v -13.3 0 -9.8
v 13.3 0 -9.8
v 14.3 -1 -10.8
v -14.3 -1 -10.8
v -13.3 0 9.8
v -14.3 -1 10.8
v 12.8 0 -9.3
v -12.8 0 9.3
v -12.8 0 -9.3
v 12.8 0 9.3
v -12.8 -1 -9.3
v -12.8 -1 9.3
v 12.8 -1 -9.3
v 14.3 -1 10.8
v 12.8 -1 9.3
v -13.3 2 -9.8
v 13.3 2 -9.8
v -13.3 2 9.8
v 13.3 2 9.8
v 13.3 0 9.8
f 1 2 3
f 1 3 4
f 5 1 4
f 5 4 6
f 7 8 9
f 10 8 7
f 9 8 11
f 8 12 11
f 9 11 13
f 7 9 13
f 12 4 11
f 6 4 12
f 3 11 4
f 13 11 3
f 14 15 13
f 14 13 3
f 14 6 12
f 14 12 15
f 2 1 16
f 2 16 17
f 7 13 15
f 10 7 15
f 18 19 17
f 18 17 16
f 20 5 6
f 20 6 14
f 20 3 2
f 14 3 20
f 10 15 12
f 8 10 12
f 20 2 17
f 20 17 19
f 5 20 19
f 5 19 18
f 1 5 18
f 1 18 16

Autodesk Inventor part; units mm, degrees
ref_plane "YZ Plane" through (0, 0, 0) normal (1, 0, 0) x (0, 1, 0)
ref_plane "XZ Plane" through (0, 0, 0) normal (0, 1, 0) x (-1, 0, 0)
ref_plane "XY Plane" through (0, 0, 0) normal (0, 0, 1) x (1, 0, 0)
sketch "Sketch1" plane through (0, 0, 0) normal (0, 1, 0) x (-1, 0, 0)
  line L0 (-13.3, 9.8) -> (13.3, 9.8)
  line L1 (13.3, 9.8) -> (13.3, -9.8)
  line L2 (13.3, -9.8) -> (-13.3, -9.8)
  line L3 (-13.3, -9.8) -> (-13.3, 9.8)
  line L4 (-13.3, 9.8) -> (13.3, -9.8) construction
  line L5 (13.3, 9.8) -> (-13.3, -9.8) construction
  point P0 (0, 0)
  dimension "d0" = 26.6
  dimension "d1" = 19.6
extrude "Extrusion1" add sketch "Sketch1" along normal blind 2
sketch "Sketch2" plane through (0, 0, 0) normal (0, -1, 0) x (1, 0, 0)
  line L0 (13.3, 9.8) -> (-13.3, 9.8) projected
  line L1 (13.3, -9.8) -> (13.3, 9.8) projected
  line L2 (-14.3, -10.8) -> (14.3, -10.8)
  line L3 (14.3, -10.8) -> (14.3, 10.8)
  line L4 (14.3, 10.8) -> (-14.3, 10.8)
  line L5 (-14.3, 10.8) -> (-14.3, -10.8)
  line L6 (-14.3, -10.8) -> (14.3, 10.8) construction
  line L7 (14.3, -10.8) -> (-14.3, 10.8) construction
  point P0 (0, 0)
  dimension "d4" = 1
  dimension "d5" = 1
extrude "Extrusion2" add sketch "Sketch2" along normal blind 1
chamfer "Chamfer1" distance 1 angle 45 4 edges at (0, 0, 10.8) (-14.3, 0, 0) (14.3, 0, 0) (0, 0, -10.8)
sketch "Sketch3" plane through (0, -1, 0) normal (0, -1, 0) x (1, 0, 0)
  line L0 (14.3, -10.8) -> (14.3, 10.8) projected
  line L1 (14.3, 10.8) -> (-14.3, 10.8) projected
  line L2 (-12.8, -9.3) -> (12.8, -9.3)
  line L3 (12.8, -9.3) -> (12.8, 9.3)
  line L4 (12.8, 9.3) -> (-12.8, 9.3)
  line L5 (-12.8, 9.3) -> (-12.8, -9.3)
  line L6 (-12.8, -9.3) -> (12.8, 9.3) construction
  line L7 (12.8, -9.3) -> (-12.8, 9.3) construction
  point P0 (0, 0)
  dimension "d11" = 1.5
  dimension "d12" = 1.5
extrude "Extrusion3" cut sketch "Sketch3" against normal blind 1
properties part number "wysw trans v2"
